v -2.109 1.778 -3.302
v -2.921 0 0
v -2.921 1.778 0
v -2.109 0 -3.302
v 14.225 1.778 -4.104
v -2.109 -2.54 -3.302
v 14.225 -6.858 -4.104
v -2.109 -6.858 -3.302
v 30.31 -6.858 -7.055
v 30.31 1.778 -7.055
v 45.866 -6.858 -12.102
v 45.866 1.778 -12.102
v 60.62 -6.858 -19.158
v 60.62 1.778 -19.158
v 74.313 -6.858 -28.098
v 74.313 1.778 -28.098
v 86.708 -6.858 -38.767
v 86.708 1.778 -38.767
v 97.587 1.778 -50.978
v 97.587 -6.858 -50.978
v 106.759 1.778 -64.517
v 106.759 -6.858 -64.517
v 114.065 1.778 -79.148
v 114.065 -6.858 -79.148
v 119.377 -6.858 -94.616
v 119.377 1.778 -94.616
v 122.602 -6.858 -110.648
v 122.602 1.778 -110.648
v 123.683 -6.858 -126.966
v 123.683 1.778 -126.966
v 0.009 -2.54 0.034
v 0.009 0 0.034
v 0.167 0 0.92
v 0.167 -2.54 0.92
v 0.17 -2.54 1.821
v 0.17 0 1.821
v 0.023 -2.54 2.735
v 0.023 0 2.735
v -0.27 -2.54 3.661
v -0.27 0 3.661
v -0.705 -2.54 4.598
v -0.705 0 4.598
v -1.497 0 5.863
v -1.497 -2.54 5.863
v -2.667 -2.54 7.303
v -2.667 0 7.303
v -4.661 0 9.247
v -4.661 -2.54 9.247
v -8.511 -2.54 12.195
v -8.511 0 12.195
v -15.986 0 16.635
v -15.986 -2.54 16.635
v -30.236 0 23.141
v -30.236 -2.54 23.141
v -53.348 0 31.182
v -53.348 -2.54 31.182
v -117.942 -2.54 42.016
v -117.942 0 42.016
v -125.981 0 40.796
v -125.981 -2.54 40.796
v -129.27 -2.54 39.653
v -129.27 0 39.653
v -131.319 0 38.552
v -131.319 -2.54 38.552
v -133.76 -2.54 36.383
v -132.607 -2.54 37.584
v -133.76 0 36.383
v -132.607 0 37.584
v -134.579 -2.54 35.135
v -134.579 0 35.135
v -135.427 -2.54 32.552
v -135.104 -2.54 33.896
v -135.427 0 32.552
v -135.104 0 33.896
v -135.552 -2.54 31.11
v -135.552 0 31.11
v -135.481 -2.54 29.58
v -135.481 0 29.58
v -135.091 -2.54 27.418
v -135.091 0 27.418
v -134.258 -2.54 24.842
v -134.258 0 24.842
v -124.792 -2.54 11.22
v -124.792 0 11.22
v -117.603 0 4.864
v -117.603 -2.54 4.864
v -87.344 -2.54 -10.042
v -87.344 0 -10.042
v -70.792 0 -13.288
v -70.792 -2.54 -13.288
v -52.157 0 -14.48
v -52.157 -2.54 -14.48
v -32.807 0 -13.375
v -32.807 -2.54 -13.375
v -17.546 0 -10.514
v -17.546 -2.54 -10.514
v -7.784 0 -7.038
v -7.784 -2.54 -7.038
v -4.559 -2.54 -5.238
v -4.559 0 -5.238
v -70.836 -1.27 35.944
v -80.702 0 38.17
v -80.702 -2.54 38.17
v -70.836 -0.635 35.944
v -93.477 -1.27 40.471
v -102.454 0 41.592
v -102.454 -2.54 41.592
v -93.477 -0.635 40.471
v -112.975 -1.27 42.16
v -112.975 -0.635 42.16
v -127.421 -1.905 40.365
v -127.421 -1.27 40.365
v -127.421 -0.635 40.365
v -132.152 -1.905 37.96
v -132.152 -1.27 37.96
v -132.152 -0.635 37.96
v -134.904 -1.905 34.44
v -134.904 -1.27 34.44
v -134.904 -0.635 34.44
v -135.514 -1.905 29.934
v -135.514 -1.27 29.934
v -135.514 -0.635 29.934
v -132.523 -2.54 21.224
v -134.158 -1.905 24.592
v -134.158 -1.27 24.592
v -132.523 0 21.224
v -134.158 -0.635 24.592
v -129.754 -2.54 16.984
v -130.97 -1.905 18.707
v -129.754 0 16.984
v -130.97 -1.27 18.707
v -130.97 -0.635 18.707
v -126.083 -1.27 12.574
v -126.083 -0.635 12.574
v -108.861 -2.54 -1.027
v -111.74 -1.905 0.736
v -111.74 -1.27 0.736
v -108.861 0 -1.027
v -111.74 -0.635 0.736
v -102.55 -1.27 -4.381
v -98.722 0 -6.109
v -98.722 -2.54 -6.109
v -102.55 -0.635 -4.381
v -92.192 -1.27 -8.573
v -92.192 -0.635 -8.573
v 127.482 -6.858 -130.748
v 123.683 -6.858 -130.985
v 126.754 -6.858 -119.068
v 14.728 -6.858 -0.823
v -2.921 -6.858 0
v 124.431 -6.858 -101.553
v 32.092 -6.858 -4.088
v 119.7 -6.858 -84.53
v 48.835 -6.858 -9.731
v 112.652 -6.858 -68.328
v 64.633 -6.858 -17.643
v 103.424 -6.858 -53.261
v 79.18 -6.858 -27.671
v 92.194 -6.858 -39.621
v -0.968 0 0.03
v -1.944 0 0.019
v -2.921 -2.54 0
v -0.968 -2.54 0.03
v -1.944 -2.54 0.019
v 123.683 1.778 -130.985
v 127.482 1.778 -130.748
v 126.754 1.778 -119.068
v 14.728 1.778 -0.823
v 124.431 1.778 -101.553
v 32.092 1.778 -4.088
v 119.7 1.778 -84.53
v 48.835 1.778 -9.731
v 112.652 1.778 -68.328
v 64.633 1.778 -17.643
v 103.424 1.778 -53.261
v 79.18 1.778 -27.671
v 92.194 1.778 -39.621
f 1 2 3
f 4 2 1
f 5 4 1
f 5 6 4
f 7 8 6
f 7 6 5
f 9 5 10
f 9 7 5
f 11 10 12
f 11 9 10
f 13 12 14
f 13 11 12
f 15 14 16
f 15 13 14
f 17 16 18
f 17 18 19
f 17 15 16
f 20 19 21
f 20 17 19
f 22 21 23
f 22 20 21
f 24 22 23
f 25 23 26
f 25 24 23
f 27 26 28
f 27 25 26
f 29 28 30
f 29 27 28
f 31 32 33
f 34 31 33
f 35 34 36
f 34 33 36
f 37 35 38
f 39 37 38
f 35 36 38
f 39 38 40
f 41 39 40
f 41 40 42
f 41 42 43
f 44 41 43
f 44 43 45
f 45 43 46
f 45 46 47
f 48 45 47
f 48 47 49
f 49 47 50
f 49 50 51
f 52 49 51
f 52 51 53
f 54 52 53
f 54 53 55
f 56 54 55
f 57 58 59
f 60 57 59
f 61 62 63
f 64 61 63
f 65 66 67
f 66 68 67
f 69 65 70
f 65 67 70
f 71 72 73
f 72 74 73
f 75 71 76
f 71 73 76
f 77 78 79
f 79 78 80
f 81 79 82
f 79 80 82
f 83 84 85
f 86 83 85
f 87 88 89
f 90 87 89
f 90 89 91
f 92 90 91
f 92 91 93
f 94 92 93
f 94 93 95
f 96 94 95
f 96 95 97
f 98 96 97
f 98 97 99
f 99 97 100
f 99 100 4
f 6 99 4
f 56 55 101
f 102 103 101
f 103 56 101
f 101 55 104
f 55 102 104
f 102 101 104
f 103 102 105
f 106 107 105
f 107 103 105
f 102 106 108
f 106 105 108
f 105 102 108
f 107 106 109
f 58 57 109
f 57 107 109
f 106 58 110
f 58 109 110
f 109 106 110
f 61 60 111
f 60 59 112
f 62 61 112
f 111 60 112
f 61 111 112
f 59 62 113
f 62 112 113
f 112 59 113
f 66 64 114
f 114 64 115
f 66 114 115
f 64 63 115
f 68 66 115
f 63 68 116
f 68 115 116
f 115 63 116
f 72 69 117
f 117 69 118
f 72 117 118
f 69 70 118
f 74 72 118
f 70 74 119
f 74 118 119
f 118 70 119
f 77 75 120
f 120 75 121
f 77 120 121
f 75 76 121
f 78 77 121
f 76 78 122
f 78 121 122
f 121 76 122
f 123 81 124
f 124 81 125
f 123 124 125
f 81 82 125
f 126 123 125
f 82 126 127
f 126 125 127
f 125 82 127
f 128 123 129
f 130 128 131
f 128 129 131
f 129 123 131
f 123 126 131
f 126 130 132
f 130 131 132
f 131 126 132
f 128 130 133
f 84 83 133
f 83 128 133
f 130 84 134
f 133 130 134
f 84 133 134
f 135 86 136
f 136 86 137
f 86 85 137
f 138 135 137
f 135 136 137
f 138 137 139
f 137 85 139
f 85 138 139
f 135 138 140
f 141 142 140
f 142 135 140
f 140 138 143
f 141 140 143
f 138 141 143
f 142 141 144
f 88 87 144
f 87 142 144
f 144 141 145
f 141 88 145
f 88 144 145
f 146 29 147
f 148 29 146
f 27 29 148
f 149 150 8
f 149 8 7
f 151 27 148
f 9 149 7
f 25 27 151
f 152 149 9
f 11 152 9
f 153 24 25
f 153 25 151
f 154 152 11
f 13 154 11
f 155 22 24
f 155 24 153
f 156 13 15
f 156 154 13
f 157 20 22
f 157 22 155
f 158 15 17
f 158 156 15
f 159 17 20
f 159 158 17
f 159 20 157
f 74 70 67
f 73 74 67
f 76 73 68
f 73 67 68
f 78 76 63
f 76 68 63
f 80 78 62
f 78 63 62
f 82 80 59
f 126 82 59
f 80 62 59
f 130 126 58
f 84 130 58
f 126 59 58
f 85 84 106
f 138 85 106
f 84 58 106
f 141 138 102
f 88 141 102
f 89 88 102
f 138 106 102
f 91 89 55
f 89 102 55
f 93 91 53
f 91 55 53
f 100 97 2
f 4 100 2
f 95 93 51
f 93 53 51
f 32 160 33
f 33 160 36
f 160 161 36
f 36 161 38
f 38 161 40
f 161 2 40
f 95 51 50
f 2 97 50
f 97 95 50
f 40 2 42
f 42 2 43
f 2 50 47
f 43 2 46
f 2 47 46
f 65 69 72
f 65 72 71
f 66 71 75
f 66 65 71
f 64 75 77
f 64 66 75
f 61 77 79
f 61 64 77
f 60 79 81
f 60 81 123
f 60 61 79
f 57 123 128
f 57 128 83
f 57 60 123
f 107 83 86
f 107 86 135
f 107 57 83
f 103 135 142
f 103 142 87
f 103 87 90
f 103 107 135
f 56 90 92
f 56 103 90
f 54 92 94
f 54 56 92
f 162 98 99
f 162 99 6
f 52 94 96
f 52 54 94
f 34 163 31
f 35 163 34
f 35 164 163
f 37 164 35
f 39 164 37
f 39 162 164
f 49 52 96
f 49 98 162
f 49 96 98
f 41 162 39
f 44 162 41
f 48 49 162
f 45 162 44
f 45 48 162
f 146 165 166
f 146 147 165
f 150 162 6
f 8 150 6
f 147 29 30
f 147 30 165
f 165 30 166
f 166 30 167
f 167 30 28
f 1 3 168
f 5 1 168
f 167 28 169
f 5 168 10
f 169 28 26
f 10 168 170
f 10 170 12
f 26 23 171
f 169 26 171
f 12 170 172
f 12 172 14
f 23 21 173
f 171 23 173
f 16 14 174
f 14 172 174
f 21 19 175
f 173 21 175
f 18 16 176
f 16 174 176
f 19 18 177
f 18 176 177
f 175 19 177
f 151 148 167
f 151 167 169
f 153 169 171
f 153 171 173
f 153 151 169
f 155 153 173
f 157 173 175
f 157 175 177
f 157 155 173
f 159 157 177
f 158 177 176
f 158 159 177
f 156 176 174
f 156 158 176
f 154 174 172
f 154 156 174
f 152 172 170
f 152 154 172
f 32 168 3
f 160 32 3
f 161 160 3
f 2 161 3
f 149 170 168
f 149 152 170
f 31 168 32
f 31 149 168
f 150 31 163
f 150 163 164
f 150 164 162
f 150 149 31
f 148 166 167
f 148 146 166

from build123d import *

# Parameters (mm, degrees)
F1_DEPTH = 2.54
F3_DEPTH = 4.318


with BuildPart() as f1:
    # F0 (on Front) → F1 (new body)
    with BuildSketch(Plane.XZ):
        with BuildLine():
            add(Edge.make_bspline(
                [(0, 0), (3.2288205225, 11.6959711466), (-70.9324180406, 41.5809971794), (-157.7916749632, 47.1308104661), (-98.9883162493, -26.9361971593), (-3.4859616414, -12.6274305097), (0, 0)],
                knots=[0, 0, 0, 0, 0.2596448322, 0.4928606883, 0.7196772261, 1, 1, 1, 1], degree=3))
        make_face()
    extrude(amount=F1_DEPTH)

    # F2 (on face) → F3 (join, symmetric)
    with BuildSketch(Plane.XZ.offset(2.54)):
        with BuildLine():
            ThreePointArc((126.7541571575, -119.0680755359), (85.8951270662, -33.4194823778), (-2.9208627529, 0))
            Line((-2.9208627529, 0), (-2.109292065, -3.3016612133))
            ThreePointArc((-2.109292065, -3.3016612133), (86.7079451621, -38.7669130987), (123.6827332993, -126.9664072138))
            Line((123.6827332993, -126.9664072138), (123.6827332993, -130.9845326543))
            Line((123.6827332993, -130.9845326543), (127.4819463096, -130.7477952948))
            Line((127.4819463096, -130.7477952948), (126.7541571575, -119.0680755359))
        make_face()
    extrude(amount=F3_DEPTH, both=True)


solid = f1.part
